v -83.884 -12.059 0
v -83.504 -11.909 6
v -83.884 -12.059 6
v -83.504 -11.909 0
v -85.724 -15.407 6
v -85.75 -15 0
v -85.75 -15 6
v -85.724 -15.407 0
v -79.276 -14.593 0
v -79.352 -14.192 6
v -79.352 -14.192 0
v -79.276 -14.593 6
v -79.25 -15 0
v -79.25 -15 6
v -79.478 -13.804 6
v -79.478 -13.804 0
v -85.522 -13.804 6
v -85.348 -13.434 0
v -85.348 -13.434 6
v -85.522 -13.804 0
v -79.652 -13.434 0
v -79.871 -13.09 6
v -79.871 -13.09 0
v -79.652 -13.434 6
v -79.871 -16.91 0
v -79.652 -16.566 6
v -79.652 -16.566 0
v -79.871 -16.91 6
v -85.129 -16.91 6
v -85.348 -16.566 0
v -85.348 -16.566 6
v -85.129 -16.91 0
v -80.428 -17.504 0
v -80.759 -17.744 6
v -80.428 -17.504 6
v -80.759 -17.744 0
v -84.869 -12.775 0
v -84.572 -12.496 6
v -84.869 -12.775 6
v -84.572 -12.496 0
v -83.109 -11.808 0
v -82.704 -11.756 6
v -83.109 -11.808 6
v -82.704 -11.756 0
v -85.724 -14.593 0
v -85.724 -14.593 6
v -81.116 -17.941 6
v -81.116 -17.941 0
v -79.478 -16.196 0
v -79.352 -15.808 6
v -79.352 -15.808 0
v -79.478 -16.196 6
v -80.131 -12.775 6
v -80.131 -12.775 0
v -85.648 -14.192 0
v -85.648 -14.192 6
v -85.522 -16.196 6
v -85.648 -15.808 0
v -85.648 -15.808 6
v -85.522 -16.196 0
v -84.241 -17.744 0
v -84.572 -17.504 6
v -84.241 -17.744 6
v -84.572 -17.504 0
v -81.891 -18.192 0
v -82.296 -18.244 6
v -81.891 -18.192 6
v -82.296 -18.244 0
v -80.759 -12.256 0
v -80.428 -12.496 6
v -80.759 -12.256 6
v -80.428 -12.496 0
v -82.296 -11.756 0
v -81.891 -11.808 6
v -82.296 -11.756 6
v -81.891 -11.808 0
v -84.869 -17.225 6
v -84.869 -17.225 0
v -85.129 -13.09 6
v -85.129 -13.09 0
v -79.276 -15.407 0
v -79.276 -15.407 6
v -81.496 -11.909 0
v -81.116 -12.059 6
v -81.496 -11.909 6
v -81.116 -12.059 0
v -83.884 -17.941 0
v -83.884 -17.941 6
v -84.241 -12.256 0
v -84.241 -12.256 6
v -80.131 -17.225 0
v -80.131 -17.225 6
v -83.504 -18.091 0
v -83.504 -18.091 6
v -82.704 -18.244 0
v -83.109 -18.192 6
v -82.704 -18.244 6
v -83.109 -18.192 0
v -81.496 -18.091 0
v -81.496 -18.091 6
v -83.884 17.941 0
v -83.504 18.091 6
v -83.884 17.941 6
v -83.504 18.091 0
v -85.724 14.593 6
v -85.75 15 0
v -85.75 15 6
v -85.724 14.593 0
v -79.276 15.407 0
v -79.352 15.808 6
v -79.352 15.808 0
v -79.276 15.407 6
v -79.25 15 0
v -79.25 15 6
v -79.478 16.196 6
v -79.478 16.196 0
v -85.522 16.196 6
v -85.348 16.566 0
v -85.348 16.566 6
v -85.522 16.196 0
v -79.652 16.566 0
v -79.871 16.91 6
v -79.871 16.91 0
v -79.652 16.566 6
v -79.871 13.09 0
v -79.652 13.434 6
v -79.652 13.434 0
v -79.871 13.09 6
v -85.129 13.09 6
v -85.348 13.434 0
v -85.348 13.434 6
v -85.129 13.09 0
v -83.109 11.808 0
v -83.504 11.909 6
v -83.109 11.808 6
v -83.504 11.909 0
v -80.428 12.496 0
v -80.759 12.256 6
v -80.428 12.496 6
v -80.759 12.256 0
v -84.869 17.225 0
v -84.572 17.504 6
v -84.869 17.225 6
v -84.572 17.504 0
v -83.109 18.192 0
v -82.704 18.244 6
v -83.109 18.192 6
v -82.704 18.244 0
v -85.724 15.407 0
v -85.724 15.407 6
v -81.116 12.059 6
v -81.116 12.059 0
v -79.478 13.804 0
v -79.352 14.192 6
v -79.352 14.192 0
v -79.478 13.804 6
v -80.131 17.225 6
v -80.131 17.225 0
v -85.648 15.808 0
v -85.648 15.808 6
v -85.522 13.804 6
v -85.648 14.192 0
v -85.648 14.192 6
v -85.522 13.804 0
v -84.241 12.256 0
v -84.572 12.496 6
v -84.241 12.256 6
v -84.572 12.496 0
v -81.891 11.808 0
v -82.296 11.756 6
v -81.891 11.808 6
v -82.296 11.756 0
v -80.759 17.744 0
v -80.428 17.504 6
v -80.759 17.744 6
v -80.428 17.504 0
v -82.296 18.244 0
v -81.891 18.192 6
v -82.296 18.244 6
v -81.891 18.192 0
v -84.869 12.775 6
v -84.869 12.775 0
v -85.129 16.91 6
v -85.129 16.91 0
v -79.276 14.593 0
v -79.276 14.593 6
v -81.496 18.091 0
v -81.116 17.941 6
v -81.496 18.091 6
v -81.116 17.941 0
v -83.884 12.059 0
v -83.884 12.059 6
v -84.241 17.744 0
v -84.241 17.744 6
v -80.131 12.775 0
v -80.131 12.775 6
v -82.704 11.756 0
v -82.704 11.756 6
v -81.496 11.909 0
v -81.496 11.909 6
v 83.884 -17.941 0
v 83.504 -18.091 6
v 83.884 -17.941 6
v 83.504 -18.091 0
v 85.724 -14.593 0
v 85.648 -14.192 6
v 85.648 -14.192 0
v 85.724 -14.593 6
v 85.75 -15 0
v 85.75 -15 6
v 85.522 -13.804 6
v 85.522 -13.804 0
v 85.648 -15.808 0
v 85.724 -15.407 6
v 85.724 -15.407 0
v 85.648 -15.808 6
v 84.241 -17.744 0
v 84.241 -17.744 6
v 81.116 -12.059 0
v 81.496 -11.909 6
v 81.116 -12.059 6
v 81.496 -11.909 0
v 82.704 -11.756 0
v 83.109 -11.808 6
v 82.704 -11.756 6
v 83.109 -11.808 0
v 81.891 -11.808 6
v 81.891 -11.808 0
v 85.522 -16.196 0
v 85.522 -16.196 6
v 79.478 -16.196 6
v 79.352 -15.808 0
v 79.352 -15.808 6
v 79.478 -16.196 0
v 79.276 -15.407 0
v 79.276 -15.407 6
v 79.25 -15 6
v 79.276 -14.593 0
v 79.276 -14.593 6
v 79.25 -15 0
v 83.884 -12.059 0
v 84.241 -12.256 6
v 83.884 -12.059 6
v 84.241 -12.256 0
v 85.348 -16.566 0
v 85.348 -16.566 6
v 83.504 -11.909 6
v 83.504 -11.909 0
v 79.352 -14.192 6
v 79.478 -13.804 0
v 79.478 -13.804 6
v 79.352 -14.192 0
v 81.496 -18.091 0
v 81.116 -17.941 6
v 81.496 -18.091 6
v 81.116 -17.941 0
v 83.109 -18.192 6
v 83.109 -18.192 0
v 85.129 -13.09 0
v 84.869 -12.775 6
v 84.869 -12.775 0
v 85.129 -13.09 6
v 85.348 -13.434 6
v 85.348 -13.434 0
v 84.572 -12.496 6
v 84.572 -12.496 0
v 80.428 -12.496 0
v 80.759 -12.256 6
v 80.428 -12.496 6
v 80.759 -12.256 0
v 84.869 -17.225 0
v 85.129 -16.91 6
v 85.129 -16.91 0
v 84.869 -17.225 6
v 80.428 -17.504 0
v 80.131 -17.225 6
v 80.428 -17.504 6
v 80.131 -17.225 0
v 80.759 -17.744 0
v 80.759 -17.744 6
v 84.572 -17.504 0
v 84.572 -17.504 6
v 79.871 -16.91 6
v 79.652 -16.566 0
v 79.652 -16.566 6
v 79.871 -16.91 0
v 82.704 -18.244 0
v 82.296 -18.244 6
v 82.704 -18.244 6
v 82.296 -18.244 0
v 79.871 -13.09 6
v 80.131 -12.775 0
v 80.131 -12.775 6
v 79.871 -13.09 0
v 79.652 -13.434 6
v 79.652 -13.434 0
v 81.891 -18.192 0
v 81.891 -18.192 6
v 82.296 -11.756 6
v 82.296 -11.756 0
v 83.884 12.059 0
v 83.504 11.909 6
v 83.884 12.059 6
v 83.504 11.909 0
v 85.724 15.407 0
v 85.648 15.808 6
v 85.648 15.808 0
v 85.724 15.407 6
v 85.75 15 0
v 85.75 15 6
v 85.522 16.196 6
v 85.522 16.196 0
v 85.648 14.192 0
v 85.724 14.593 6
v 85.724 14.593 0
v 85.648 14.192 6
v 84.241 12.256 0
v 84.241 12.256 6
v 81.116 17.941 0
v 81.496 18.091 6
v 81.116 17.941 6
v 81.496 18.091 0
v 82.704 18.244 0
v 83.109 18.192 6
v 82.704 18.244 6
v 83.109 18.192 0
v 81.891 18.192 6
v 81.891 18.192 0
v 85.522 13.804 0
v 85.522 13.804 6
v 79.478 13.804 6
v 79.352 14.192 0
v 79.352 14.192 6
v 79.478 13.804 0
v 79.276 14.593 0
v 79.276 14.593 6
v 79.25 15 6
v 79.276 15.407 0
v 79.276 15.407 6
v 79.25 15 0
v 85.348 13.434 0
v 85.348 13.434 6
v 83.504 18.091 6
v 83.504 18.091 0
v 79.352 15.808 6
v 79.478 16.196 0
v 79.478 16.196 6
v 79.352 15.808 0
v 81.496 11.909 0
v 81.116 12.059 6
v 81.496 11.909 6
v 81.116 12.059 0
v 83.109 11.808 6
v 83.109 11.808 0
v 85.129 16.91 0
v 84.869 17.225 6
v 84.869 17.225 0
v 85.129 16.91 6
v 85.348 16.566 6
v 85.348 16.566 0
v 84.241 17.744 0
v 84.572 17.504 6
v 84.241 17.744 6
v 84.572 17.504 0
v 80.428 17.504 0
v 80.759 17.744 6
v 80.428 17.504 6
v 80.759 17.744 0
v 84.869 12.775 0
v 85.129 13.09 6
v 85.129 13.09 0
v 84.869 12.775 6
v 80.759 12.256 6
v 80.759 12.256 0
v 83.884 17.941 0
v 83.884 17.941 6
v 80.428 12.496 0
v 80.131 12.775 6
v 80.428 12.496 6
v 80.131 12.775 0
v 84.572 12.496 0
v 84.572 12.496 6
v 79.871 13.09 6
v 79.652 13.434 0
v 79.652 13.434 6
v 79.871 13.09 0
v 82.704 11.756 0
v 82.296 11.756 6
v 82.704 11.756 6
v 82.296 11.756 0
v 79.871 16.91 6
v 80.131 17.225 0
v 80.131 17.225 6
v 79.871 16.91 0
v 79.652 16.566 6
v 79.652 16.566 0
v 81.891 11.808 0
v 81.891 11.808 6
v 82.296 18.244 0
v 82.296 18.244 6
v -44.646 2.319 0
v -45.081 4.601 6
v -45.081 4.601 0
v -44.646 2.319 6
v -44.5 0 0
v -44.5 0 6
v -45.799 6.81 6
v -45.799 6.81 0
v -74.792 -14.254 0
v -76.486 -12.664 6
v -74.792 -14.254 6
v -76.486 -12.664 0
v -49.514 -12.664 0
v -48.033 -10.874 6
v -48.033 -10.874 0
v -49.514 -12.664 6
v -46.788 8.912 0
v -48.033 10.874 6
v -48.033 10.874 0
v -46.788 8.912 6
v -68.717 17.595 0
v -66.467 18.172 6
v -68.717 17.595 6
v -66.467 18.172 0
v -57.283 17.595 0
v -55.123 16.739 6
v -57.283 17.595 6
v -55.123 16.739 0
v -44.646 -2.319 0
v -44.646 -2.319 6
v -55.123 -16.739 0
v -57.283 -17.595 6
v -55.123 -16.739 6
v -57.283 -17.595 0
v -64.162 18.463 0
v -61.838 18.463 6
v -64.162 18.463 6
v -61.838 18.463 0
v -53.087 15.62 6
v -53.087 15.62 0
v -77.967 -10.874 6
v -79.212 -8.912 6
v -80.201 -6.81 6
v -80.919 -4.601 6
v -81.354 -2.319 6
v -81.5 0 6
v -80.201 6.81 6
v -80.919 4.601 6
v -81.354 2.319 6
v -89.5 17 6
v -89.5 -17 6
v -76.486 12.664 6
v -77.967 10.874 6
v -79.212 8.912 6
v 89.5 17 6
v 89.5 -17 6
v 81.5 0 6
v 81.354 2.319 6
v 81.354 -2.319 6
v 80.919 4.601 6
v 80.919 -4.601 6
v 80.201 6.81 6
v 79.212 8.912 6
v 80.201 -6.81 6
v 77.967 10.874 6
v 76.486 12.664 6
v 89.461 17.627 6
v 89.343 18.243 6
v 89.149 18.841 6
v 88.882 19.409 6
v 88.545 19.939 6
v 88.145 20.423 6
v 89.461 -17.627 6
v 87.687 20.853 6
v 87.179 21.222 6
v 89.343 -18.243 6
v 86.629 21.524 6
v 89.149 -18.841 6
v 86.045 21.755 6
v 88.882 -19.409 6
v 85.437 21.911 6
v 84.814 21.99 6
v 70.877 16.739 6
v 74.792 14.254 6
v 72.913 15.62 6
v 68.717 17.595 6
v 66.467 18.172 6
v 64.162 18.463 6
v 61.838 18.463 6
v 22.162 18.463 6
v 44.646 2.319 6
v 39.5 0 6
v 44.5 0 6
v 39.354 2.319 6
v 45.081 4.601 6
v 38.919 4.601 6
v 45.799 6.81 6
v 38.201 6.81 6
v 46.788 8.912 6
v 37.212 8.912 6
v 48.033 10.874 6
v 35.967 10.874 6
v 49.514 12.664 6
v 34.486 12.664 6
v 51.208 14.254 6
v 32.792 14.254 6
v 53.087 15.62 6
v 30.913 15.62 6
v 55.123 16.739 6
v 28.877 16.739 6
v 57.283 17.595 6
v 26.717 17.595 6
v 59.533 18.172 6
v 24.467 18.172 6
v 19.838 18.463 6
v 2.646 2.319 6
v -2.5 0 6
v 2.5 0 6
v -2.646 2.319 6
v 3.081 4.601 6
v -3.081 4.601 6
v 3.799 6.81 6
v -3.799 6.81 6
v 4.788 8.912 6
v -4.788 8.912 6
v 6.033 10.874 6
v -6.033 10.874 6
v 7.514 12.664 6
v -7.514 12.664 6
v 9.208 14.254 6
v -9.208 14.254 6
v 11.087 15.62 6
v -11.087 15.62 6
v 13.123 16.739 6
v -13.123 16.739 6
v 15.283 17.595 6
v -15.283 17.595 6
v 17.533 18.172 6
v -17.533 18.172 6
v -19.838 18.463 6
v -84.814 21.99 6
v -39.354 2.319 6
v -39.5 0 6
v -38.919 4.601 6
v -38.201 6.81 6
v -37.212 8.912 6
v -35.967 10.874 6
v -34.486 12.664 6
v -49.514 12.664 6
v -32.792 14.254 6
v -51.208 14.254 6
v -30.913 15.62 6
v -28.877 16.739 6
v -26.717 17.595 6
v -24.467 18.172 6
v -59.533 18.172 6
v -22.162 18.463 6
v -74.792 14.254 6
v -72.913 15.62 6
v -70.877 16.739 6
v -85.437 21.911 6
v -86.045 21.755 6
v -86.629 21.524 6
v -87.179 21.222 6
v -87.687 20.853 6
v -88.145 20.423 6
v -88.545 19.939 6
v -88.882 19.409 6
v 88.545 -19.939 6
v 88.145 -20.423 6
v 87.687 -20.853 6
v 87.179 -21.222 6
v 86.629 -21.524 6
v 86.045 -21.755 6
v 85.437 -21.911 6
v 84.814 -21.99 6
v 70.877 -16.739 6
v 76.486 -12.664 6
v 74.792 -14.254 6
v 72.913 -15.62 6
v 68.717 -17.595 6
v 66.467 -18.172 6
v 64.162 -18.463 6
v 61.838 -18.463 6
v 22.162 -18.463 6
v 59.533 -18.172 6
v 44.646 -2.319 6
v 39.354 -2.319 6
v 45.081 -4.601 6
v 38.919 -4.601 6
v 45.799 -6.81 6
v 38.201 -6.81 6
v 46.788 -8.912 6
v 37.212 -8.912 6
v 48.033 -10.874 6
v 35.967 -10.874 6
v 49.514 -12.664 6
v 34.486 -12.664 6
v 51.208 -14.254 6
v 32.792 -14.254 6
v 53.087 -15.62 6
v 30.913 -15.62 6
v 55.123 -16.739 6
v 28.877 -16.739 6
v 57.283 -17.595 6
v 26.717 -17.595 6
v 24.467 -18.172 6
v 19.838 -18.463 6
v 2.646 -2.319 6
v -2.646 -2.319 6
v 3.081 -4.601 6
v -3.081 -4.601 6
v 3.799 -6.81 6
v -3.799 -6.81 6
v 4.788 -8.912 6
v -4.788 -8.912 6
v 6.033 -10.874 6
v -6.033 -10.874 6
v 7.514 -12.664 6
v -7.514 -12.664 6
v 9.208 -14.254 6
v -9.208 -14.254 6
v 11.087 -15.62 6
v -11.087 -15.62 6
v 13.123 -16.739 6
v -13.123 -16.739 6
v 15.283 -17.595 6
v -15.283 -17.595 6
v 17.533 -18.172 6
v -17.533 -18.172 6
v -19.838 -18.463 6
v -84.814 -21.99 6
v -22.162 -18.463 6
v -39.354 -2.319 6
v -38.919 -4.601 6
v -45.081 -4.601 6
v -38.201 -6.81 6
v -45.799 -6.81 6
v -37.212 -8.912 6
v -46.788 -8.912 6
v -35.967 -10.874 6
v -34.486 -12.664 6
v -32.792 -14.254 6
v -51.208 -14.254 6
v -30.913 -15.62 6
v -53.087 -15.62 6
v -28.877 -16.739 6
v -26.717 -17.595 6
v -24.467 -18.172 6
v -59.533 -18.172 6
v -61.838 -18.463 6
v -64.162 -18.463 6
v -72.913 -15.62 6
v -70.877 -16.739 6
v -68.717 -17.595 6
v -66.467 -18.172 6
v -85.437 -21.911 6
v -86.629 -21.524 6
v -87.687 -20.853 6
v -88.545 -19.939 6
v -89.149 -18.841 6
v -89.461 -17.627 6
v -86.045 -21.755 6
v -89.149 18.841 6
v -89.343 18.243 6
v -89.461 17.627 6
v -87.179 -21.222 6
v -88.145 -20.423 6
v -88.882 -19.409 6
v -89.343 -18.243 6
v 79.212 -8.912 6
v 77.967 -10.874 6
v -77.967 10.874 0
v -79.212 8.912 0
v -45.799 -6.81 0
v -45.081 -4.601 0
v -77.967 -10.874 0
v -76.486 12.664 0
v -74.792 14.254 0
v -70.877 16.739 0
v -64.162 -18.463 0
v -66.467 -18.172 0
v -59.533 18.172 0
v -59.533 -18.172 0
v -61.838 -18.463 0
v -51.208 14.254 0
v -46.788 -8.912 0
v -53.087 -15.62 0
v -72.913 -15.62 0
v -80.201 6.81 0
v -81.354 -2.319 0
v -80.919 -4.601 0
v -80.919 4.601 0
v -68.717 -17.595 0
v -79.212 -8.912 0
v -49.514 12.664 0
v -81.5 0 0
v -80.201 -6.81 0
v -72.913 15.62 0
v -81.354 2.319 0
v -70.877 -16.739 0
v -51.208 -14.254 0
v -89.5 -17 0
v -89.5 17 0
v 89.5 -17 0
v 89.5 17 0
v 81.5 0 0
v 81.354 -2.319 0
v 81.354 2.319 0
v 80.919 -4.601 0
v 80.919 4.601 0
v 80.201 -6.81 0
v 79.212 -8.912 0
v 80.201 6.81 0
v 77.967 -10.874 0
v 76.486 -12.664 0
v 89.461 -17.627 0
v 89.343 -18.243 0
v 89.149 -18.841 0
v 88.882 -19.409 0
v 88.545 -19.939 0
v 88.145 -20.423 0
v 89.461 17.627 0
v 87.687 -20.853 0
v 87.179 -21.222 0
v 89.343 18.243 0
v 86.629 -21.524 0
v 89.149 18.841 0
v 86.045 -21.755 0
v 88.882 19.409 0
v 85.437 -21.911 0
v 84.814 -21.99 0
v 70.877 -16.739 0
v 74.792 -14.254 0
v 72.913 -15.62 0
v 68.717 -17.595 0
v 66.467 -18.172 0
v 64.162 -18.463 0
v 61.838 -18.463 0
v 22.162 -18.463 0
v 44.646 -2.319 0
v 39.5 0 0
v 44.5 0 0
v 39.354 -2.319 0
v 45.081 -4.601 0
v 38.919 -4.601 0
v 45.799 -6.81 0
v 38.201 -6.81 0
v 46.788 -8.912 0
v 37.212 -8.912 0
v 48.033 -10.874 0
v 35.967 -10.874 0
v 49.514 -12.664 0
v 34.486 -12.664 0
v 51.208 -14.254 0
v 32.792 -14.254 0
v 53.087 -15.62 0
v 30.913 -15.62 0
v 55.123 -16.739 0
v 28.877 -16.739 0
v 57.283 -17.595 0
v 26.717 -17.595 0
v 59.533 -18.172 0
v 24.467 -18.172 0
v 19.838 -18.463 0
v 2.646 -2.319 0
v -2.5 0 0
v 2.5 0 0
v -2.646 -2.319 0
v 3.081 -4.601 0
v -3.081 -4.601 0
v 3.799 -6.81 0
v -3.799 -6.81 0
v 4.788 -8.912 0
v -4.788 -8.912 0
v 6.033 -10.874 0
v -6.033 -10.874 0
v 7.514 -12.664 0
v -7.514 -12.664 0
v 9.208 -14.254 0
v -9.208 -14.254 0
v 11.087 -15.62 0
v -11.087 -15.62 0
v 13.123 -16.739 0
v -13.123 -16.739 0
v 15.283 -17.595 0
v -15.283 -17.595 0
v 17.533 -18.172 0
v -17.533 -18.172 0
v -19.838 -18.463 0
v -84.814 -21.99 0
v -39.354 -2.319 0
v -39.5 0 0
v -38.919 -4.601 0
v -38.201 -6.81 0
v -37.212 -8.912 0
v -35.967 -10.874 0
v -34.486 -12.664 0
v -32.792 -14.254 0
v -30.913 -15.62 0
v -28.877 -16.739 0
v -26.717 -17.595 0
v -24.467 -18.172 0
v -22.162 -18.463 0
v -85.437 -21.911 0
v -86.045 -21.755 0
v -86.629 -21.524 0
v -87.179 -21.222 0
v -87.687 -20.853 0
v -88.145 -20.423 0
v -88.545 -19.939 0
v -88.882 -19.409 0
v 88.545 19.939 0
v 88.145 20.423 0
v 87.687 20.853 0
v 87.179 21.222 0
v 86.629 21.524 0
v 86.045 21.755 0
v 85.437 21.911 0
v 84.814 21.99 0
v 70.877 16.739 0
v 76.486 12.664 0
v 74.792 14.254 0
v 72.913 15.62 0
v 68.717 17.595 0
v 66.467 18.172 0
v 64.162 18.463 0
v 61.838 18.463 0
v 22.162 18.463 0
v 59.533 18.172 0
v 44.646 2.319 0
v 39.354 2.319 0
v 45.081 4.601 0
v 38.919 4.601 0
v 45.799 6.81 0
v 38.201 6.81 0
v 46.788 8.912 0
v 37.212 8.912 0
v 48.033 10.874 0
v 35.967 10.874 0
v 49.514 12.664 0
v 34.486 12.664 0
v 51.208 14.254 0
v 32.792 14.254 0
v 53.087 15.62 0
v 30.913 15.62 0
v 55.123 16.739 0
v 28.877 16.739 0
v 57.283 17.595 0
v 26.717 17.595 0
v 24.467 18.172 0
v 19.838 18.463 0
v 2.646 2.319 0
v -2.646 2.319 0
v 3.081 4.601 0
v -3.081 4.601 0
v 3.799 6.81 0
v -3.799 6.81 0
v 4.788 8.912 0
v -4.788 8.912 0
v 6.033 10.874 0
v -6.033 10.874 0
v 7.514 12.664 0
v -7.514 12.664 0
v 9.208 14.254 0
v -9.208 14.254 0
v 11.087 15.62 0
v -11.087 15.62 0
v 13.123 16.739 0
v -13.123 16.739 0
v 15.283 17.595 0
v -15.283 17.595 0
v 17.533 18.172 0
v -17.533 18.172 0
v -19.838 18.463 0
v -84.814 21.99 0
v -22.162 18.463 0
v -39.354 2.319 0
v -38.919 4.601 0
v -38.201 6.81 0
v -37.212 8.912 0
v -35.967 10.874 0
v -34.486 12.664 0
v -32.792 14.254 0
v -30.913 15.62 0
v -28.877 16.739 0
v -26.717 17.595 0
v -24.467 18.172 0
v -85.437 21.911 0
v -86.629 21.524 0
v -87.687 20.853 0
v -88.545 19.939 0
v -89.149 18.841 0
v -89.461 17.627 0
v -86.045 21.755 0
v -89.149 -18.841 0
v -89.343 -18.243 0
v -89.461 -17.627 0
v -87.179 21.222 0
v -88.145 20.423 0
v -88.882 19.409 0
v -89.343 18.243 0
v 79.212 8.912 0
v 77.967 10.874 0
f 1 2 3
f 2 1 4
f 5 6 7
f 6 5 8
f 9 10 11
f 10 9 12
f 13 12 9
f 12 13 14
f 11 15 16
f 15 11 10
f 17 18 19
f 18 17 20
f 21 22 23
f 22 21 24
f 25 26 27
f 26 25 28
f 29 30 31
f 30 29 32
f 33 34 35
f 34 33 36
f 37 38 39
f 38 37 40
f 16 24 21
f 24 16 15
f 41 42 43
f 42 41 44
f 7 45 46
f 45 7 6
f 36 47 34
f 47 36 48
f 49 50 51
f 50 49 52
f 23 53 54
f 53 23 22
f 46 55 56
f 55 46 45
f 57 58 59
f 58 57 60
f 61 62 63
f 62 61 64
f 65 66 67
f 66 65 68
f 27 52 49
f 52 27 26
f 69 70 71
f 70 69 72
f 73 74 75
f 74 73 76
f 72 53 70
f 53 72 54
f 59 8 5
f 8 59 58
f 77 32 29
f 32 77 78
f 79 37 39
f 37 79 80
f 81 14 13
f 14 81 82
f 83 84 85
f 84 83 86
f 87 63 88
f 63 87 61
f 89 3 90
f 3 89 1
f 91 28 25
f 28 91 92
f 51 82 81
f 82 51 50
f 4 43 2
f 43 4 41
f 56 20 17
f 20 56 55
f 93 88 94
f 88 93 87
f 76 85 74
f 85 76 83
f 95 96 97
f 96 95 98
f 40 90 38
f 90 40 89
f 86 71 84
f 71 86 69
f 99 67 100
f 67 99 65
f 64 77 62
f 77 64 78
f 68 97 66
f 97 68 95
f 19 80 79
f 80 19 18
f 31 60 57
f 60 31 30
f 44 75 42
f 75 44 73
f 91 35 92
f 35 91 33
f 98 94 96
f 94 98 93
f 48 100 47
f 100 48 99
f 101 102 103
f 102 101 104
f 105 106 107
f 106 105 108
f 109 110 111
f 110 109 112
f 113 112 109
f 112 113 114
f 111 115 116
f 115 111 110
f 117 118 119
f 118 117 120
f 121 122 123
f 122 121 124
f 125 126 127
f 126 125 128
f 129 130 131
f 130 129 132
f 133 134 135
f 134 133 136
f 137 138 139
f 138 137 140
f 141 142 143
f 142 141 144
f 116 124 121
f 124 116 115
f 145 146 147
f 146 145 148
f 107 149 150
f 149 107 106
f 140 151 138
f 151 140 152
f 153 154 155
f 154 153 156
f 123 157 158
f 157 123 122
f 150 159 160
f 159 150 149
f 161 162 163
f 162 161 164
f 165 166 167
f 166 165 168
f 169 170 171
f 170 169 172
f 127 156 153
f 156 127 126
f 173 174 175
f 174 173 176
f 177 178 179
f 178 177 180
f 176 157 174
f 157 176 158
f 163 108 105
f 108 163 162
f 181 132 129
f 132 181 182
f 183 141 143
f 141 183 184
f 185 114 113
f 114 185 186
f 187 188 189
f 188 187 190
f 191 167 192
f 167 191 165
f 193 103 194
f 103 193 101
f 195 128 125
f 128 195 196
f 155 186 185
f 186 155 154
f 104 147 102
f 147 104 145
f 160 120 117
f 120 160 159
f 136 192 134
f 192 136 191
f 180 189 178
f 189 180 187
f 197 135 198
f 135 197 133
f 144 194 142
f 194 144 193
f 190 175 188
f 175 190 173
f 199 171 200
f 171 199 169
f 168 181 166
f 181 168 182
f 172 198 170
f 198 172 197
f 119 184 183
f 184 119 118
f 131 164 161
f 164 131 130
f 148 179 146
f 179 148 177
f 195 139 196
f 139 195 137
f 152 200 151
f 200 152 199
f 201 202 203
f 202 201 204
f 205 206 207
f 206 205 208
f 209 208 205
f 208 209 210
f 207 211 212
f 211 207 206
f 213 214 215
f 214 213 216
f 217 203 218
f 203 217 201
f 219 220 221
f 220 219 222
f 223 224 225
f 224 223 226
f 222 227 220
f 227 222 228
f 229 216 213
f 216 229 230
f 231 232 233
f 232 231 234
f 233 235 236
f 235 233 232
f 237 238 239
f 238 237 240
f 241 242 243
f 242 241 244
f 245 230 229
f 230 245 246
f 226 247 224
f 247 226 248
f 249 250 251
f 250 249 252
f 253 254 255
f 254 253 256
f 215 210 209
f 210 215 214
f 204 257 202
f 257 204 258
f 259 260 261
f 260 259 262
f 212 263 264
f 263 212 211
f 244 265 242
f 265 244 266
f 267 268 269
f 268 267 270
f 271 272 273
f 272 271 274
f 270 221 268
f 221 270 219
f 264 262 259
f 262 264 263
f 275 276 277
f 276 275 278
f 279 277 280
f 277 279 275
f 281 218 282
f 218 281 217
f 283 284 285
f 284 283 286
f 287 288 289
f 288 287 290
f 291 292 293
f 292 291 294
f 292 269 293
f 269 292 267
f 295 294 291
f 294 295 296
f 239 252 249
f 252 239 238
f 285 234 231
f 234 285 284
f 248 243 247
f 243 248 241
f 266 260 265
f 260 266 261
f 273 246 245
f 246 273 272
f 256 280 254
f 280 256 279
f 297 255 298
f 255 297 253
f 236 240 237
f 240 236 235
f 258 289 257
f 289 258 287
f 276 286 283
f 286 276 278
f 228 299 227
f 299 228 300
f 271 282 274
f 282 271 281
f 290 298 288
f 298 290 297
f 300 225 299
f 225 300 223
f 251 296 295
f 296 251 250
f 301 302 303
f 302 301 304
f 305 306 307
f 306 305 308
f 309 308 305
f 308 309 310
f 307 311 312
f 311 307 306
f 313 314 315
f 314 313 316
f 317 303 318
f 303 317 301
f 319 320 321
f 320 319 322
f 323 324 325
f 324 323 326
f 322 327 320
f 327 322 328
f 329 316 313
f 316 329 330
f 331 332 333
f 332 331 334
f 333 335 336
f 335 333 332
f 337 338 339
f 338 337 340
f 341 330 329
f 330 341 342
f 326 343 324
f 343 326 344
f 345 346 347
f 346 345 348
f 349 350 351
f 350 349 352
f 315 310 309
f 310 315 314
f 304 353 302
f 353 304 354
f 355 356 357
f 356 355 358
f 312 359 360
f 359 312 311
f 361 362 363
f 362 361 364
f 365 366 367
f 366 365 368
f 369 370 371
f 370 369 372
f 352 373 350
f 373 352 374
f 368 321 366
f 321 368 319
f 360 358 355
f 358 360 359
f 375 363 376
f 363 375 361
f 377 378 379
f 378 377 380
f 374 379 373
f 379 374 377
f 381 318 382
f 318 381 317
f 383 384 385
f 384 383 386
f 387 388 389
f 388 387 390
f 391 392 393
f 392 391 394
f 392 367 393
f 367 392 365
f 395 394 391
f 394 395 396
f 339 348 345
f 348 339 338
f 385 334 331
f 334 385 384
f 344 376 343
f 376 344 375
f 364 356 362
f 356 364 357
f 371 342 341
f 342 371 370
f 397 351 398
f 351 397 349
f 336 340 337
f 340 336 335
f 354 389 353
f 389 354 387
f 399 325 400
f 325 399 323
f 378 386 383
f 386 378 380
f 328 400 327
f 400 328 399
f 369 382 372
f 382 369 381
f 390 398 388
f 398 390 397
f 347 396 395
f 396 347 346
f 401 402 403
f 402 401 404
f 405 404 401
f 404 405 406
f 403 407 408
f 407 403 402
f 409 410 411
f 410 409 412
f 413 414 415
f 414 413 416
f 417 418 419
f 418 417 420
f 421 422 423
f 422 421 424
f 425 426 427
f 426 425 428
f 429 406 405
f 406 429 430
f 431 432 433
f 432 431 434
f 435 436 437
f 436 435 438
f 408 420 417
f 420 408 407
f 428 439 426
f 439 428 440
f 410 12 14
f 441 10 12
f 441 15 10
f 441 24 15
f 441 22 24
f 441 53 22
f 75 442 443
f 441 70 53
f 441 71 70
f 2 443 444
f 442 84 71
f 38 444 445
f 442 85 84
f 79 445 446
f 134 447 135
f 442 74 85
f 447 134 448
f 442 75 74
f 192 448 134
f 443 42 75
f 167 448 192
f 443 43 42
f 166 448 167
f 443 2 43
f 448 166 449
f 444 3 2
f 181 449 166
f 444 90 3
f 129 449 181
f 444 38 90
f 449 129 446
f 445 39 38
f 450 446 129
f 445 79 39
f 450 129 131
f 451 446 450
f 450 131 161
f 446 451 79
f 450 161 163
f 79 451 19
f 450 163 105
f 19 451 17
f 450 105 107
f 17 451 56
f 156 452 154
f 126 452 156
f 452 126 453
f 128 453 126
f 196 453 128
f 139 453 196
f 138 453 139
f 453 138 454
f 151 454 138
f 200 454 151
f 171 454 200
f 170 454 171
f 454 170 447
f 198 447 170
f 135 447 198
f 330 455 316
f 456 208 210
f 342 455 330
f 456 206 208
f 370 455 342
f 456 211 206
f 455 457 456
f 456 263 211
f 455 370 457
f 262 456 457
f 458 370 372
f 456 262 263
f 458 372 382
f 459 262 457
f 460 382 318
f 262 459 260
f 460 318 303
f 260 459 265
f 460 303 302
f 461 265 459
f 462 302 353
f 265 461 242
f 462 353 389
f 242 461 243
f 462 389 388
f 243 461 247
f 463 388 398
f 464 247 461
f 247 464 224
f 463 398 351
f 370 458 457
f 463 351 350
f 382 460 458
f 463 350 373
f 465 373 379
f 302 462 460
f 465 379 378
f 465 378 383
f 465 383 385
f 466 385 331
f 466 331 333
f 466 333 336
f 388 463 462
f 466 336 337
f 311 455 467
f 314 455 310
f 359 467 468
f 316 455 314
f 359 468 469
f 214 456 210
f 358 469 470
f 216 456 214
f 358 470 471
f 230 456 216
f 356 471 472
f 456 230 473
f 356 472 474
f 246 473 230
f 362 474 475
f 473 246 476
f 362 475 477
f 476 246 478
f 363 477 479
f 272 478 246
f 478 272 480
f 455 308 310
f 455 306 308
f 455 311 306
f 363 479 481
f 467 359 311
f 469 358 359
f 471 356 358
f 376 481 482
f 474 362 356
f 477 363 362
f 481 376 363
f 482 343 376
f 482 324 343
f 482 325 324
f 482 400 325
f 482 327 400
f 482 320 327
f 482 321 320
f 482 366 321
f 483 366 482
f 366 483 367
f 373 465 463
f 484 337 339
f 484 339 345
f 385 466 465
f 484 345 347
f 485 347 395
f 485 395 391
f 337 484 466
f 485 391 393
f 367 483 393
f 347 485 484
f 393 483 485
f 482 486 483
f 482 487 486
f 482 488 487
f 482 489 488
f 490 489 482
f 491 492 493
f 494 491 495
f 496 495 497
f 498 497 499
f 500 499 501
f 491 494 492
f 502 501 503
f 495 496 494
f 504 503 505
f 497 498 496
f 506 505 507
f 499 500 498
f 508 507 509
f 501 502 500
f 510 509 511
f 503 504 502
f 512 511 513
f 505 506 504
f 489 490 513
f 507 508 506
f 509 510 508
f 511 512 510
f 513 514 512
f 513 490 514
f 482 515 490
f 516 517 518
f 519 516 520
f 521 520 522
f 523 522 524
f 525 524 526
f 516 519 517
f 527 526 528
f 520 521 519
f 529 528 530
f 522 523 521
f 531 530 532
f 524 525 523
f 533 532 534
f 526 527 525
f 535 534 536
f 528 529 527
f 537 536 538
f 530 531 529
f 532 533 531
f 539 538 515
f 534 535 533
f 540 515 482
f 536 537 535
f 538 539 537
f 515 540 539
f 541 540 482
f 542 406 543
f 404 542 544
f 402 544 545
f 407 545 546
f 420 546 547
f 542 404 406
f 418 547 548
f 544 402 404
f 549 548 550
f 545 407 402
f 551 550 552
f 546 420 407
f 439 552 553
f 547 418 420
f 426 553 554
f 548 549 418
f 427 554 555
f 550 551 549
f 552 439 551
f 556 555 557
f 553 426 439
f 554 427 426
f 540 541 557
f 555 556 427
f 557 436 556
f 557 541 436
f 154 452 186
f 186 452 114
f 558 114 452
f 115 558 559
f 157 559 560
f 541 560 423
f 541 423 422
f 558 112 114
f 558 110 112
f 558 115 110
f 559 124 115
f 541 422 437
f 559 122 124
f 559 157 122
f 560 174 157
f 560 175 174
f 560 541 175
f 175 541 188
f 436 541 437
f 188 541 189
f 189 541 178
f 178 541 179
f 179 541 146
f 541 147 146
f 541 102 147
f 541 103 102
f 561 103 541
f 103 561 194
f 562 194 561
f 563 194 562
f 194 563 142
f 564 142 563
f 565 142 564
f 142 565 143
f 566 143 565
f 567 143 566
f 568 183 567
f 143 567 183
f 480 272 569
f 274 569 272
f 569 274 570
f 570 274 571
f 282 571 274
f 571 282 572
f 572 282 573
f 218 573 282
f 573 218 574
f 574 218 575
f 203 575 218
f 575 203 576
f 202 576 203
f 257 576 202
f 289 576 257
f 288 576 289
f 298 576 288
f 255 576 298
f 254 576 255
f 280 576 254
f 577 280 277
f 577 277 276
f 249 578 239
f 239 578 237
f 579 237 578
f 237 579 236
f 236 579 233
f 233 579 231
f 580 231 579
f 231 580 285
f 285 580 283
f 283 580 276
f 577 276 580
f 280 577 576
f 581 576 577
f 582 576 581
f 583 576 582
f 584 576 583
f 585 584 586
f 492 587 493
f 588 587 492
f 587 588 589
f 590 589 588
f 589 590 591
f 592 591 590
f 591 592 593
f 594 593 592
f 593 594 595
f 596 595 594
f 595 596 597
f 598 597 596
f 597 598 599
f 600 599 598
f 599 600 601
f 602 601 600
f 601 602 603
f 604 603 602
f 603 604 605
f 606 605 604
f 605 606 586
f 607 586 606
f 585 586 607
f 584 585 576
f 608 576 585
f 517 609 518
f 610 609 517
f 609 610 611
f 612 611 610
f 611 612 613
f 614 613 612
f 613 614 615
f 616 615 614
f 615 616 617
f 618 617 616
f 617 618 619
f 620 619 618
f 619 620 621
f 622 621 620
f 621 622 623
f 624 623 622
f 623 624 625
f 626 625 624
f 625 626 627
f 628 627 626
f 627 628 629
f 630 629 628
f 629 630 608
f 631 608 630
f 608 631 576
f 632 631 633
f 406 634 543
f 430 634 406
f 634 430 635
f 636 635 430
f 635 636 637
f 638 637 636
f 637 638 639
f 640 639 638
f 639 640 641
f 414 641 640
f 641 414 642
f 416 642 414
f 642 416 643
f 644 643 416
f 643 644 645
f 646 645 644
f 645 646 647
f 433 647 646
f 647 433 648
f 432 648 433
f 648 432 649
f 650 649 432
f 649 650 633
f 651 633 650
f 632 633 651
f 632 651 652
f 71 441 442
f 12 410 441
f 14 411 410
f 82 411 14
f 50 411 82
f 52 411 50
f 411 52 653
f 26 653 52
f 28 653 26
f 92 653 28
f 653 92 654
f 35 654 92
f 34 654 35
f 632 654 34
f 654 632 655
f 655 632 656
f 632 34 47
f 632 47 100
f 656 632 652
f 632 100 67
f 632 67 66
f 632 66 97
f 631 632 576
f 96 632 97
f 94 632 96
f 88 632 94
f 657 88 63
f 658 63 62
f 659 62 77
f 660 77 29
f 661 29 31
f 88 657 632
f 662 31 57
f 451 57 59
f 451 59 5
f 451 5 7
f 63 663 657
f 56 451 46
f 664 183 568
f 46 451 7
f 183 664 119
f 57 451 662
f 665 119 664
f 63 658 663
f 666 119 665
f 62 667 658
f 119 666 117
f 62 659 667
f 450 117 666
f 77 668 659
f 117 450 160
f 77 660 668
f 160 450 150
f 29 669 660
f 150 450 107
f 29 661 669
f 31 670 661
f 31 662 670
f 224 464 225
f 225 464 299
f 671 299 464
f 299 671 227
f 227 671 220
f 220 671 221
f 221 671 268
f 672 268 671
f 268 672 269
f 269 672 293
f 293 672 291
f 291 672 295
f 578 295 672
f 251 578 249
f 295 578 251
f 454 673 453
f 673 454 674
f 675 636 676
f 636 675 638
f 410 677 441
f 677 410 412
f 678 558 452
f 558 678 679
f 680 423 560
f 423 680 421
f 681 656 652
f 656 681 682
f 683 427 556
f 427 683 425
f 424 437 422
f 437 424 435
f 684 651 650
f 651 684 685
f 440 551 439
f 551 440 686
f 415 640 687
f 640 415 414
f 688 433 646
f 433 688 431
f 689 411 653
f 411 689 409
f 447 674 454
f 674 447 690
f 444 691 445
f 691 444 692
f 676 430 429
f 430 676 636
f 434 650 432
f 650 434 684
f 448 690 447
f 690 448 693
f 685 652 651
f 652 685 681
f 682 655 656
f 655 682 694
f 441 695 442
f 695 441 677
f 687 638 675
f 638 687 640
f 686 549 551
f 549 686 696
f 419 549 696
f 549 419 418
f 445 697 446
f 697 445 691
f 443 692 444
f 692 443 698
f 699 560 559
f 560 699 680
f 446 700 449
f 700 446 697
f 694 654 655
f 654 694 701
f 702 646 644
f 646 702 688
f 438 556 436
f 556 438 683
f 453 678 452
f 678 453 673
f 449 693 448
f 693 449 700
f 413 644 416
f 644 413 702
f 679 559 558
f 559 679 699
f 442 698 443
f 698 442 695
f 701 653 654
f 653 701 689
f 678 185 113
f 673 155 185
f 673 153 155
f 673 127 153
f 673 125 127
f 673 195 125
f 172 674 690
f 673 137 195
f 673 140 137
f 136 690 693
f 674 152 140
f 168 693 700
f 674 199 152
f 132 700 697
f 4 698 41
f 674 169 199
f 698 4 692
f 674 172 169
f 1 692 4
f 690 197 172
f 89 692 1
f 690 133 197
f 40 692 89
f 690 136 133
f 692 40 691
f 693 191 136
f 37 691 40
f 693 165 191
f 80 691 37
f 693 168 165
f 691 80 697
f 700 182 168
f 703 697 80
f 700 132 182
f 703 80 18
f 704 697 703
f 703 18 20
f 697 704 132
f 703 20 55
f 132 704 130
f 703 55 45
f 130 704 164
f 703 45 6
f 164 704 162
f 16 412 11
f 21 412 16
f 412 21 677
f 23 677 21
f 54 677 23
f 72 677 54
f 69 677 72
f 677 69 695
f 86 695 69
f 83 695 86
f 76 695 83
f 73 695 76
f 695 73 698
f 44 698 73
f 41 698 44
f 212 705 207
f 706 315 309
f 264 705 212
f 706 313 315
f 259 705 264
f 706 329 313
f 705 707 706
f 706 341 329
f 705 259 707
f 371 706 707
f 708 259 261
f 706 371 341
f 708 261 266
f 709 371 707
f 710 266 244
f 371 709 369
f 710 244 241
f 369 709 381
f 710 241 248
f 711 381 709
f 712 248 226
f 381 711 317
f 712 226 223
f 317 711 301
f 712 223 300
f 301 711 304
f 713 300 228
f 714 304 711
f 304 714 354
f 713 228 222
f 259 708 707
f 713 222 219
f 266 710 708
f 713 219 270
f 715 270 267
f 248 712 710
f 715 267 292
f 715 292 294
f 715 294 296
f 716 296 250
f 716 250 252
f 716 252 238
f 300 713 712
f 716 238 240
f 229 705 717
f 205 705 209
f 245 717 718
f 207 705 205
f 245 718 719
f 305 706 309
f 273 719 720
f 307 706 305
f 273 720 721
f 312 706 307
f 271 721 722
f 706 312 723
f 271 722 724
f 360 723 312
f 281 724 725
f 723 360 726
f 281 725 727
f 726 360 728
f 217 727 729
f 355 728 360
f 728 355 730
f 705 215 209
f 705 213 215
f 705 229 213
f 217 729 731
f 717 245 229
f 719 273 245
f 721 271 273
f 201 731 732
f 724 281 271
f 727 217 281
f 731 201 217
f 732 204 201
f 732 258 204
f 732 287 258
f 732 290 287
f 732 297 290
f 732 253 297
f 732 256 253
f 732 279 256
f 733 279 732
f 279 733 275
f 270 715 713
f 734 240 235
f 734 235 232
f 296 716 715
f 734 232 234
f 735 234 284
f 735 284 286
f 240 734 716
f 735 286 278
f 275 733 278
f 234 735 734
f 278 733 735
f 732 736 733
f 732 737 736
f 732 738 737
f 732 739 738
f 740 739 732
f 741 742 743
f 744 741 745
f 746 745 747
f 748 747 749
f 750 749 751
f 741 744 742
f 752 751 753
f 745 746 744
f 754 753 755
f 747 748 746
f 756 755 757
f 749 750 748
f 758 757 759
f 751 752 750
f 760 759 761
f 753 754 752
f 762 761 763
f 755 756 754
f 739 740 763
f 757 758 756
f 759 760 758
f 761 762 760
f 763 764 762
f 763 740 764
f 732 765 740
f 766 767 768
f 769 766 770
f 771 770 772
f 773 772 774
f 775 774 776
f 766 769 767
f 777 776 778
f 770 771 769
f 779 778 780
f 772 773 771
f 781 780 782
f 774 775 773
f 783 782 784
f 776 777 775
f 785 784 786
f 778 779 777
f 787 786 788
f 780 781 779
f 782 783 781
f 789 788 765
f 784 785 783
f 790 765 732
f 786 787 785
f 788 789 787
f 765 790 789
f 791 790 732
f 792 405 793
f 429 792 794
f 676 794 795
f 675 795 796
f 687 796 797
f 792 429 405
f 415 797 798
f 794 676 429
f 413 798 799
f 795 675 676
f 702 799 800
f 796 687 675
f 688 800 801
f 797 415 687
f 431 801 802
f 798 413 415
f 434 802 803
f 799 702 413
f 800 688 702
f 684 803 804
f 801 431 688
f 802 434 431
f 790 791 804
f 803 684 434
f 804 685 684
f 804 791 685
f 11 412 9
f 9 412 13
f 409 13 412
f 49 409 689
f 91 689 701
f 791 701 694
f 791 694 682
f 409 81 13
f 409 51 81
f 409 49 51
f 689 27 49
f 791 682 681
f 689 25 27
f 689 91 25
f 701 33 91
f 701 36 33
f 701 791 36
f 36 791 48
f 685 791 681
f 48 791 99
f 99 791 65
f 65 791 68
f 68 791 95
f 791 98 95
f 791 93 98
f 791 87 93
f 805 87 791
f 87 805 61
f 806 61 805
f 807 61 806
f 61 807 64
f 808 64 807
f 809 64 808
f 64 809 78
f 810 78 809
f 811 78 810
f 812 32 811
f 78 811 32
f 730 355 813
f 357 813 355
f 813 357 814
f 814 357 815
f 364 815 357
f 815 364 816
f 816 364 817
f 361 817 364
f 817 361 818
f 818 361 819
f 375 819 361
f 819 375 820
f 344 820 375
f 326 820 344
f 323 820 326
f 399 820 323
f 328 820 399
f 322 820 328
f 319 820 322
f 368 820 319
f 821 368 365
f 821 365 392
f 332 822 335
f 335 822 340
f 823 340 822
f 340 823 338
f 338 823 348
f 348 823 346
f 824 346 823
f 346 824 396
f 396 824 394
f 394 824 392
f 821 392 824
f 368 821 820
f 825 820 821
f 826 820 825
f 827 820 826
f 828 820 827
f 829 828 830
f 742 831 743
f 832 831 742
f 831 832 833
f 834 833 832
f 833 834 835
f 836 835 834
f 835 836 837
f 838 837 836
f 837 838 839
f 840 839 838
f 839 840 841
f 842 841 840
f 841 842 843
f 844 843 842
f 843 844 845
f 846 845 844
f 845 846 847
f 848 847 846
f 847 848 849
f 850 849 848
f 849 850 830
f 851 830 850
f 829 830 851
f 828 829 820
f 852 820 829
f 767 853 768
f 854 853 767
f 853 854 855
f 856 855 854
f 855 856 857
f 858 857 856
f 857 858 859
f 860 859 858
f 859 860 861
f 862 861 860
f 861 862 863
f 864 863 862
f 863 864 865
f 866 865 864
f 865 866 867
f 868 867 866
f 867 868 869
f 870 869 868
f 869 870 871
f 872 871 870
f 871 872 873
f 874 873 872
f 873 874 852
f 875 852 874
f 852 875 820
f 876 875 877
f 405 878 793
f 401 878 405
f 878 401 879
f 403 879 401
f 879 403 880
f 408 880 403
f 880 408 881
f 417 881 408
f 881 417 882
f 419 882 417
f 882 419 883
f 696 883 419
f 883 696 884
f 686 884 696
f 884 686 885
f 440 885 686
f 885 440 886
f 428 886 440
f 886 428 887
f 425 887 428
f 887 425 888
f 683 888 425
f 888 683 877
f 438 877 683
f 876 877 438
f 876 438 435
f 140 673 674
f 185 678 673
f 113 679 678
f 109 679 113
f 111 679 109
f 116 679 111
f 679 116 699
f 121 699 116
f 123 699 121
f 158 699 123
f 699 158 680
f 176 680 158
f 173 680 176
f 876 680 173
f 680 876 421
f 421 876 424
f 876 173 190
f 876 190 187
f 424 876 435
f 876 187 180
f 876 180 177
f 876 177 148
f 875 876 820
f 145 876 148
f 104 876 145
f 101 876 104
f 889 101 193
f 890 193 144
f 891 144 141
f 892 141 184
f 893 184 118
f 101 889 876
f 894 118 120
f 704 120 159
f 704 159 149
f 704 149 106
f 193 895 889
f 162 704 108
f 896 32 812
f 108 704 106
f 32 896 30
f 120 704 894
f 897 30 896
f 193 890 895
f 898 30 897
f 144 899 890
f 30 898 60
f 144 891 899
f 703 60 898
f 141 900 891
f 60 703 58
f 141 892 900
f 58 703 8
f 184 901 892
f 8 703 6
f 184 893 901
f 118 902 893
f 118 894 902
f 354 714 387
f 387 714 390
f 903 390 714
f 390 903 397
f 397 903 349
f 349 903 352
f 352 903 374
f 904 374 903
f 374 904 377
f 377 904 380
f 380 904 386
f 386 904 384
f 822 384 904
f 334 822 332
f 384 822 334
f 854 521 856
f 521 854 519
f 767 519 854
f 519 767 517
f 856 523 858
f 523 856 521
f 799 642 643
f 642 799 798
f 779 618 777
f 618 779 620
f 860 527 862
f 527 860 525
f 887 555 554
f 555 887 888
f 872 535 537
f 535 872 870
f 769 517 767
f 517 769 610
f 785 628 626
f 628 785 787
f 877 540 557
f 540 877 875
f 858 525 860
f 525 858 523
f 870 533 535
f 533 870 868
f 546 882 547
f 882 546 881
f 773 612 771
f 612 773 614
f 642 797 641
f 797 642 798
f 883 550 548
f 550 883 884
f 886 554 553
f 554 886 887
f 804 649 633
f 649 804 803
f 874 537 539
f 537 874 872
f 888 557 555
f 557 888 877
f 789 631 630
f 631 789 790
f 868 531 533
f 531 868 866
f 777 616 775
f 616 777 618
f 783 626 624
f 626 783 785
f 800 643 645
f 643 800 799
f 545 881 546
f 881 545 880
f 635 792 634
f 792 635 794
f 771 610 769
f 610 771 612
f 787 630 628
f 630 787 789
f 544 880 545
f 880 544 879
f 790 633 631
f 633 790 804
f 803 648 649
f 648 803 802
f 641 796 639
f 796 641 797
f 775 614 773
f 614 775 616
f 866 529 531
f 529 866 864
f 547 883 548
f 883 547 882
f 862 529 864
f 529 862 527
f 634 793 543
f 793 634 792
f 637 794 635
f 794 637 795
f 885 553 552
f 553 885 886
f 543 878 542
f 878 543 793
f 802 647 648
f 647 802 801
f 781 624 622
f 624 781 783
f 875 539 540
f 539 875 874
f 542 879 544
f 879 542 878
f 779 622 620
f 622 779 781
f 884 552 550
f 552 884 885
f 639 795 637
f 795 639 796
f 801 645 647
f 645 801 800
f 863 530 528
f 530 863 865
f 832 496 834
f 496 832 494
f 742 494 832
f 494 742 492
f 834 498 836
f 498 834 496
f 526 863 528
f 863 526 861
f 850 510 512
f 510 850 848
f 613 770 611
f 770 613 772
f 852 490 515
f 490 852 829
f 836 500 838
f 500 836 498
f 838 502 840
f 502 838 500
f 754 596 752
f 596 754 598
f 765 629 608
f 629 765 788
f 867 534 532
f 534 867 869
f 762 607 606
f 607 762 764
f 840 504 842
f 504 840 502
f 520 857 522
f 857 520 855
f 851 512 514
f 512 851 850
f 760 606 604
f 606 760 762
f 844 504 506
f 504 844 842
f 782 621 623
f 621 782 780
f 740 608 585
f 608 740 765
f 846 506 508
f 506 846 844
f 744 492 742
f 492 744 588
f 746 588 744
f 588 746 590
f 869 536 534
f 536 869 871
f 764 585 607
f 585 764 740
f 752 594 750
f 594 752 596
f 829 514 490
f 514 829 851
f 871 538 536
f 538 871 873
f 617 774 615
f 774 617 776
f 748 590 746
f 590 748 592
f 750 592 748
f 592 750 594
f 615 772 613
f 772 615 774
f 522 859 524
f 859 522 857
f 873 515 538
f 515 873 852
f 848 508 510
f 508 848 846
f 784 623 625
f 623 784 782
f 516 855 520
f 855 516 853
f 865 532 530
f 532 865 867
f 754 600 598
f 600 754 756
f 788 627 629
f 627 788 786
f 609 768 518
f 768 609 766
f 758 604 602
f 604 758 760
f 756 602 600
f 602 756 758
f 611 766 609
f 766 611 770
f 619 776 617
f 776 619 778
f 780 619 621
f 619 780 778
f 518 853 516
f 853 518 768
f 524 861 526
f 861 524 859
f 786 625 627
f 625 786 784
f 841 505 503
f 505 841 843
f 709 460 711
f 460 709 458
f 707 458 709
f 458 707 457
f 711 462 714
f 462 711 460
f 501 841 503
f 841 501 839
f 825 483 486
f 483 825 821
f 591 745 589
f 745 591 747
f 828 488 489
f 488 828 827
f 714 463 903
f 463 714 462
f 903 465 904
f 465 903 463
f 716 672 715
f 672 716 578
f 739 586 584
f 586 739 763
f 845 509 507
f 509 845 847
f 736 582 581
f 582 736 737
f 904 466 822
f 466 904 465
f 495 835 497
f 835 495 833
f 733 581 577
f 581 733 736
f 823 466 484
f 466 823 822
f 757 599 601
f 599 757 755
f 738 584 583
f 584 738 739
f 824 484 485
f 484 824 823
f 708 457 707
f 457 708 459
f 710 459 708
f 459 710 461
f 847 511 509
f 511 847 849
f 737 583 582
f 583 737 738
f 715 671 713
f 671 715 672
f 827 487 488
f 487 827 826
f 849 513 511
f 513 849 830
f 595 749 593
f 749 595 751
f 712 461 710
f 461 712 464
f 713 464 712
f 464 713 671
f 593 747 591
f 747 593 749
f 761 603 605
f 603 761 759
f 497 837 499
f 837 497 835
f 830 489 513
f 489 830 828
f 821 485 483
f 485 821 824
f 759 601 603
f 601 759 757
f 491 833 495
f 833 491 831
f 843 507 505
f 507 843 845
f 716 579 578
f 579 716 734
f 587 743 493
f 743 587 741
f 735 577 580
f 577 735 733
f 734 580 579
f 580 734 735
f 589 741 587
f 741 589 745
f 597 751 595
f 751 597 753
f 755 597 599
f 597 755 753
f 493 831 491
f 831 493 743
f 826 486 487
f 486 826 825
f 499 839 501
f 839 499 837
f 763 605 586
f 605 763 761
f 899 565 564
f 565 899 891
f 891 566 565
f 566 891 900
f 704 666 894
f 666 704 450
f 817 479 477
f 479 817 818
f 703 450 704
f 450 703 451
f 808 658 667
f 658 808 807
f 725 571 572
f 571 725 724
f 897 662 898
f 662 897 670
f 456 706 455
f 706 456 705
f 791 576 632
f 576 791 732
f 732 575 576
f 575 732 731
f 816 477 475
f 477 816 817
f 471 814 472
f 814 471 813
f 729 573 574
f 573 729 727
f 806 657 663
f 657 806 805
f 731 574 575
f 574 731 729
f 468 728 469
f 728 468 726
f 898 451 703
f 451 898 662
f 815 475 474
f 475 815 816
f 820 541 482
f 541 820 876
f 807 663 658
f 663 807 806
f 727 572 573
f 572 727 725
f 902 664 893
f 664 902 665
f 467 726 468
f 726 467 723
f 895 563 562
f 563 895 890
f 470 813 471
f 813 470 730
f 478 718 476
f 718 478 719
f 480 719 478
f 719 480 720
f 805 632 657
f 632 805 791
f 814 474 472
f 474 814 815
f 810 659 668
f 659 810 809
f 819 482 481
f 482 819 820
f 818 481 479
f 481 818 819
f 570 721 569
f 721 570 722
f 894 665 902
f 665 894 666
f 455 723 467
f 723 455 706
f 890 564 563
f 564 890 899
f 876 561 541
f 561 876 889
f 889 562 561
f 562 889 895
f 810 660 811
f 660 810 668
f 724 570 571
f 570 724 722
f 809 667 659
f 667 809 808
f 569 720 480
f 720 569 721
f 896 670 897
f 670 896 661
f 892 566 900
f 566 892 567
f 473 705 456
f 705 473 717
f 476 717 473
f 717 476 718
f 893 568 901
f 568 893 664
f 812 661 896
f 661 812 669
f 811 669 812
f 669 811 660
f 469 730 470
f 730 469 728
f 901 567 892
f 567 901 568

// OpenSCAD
$fn = 50;


difference() {
	union() {
		hull() {
			translate(v = [-84.5000000000, 17.0000000000, 0]) {
				cylinder(h = 6, r = 5);
			}
			translate(v = [84.5000000000, 17.0000000000, 0]) {
				cylinder(h = 6, r = 5);
			}
			translate(v = [-84.5000000000, -17.0000000000, 0]) {
				cylinder(h = 6, r = 5);
			}
			translate(v = [84.5000000000, -17.0000000000, 0]) {
				cylinder(h = 6, r = 5);
			}
		}
	}
	union() {
		#translate(v = [-82.5000000000, -15.0000000000, -100.0000000000]) {
			cylinder(h = 200, r = 3.2500000000);
		}
		#translate(v = [-82.5000000000, 15.0000000000, -100.0000000000]) {
			cylinder(h = 200, r = 3.2500000000);
		}
		#translate(v = [82.5000000000, -15.0000000000, -100.0000000000]) {
			cylinder(h = 200, r = 3.2500000000);
		}
		#translate(v = [82.5000000000, 15.0000000000, -100.0000000000]) {
			cylinder(h = 200, r = 3.2500000000);
		}
		#translate(v = [-63.0000000000, 0, 0]) {
			cylinder(h = 6, r = 18.5000000000);
		}
		#translate(v = [-21.0000000000, 0, 0]) {
			cylinder(h = 6, r = 18.5000000000);
		}
		#translate(v = [21.0000000000, 0, 0]) {
			cylinder(h = 6, r = 18.5000000000);
		}
		#translate(v = [63.0000000000, 0, 0]) {
			cylinder(h = 6, r = 18.5000000000);
		}
	}
}
